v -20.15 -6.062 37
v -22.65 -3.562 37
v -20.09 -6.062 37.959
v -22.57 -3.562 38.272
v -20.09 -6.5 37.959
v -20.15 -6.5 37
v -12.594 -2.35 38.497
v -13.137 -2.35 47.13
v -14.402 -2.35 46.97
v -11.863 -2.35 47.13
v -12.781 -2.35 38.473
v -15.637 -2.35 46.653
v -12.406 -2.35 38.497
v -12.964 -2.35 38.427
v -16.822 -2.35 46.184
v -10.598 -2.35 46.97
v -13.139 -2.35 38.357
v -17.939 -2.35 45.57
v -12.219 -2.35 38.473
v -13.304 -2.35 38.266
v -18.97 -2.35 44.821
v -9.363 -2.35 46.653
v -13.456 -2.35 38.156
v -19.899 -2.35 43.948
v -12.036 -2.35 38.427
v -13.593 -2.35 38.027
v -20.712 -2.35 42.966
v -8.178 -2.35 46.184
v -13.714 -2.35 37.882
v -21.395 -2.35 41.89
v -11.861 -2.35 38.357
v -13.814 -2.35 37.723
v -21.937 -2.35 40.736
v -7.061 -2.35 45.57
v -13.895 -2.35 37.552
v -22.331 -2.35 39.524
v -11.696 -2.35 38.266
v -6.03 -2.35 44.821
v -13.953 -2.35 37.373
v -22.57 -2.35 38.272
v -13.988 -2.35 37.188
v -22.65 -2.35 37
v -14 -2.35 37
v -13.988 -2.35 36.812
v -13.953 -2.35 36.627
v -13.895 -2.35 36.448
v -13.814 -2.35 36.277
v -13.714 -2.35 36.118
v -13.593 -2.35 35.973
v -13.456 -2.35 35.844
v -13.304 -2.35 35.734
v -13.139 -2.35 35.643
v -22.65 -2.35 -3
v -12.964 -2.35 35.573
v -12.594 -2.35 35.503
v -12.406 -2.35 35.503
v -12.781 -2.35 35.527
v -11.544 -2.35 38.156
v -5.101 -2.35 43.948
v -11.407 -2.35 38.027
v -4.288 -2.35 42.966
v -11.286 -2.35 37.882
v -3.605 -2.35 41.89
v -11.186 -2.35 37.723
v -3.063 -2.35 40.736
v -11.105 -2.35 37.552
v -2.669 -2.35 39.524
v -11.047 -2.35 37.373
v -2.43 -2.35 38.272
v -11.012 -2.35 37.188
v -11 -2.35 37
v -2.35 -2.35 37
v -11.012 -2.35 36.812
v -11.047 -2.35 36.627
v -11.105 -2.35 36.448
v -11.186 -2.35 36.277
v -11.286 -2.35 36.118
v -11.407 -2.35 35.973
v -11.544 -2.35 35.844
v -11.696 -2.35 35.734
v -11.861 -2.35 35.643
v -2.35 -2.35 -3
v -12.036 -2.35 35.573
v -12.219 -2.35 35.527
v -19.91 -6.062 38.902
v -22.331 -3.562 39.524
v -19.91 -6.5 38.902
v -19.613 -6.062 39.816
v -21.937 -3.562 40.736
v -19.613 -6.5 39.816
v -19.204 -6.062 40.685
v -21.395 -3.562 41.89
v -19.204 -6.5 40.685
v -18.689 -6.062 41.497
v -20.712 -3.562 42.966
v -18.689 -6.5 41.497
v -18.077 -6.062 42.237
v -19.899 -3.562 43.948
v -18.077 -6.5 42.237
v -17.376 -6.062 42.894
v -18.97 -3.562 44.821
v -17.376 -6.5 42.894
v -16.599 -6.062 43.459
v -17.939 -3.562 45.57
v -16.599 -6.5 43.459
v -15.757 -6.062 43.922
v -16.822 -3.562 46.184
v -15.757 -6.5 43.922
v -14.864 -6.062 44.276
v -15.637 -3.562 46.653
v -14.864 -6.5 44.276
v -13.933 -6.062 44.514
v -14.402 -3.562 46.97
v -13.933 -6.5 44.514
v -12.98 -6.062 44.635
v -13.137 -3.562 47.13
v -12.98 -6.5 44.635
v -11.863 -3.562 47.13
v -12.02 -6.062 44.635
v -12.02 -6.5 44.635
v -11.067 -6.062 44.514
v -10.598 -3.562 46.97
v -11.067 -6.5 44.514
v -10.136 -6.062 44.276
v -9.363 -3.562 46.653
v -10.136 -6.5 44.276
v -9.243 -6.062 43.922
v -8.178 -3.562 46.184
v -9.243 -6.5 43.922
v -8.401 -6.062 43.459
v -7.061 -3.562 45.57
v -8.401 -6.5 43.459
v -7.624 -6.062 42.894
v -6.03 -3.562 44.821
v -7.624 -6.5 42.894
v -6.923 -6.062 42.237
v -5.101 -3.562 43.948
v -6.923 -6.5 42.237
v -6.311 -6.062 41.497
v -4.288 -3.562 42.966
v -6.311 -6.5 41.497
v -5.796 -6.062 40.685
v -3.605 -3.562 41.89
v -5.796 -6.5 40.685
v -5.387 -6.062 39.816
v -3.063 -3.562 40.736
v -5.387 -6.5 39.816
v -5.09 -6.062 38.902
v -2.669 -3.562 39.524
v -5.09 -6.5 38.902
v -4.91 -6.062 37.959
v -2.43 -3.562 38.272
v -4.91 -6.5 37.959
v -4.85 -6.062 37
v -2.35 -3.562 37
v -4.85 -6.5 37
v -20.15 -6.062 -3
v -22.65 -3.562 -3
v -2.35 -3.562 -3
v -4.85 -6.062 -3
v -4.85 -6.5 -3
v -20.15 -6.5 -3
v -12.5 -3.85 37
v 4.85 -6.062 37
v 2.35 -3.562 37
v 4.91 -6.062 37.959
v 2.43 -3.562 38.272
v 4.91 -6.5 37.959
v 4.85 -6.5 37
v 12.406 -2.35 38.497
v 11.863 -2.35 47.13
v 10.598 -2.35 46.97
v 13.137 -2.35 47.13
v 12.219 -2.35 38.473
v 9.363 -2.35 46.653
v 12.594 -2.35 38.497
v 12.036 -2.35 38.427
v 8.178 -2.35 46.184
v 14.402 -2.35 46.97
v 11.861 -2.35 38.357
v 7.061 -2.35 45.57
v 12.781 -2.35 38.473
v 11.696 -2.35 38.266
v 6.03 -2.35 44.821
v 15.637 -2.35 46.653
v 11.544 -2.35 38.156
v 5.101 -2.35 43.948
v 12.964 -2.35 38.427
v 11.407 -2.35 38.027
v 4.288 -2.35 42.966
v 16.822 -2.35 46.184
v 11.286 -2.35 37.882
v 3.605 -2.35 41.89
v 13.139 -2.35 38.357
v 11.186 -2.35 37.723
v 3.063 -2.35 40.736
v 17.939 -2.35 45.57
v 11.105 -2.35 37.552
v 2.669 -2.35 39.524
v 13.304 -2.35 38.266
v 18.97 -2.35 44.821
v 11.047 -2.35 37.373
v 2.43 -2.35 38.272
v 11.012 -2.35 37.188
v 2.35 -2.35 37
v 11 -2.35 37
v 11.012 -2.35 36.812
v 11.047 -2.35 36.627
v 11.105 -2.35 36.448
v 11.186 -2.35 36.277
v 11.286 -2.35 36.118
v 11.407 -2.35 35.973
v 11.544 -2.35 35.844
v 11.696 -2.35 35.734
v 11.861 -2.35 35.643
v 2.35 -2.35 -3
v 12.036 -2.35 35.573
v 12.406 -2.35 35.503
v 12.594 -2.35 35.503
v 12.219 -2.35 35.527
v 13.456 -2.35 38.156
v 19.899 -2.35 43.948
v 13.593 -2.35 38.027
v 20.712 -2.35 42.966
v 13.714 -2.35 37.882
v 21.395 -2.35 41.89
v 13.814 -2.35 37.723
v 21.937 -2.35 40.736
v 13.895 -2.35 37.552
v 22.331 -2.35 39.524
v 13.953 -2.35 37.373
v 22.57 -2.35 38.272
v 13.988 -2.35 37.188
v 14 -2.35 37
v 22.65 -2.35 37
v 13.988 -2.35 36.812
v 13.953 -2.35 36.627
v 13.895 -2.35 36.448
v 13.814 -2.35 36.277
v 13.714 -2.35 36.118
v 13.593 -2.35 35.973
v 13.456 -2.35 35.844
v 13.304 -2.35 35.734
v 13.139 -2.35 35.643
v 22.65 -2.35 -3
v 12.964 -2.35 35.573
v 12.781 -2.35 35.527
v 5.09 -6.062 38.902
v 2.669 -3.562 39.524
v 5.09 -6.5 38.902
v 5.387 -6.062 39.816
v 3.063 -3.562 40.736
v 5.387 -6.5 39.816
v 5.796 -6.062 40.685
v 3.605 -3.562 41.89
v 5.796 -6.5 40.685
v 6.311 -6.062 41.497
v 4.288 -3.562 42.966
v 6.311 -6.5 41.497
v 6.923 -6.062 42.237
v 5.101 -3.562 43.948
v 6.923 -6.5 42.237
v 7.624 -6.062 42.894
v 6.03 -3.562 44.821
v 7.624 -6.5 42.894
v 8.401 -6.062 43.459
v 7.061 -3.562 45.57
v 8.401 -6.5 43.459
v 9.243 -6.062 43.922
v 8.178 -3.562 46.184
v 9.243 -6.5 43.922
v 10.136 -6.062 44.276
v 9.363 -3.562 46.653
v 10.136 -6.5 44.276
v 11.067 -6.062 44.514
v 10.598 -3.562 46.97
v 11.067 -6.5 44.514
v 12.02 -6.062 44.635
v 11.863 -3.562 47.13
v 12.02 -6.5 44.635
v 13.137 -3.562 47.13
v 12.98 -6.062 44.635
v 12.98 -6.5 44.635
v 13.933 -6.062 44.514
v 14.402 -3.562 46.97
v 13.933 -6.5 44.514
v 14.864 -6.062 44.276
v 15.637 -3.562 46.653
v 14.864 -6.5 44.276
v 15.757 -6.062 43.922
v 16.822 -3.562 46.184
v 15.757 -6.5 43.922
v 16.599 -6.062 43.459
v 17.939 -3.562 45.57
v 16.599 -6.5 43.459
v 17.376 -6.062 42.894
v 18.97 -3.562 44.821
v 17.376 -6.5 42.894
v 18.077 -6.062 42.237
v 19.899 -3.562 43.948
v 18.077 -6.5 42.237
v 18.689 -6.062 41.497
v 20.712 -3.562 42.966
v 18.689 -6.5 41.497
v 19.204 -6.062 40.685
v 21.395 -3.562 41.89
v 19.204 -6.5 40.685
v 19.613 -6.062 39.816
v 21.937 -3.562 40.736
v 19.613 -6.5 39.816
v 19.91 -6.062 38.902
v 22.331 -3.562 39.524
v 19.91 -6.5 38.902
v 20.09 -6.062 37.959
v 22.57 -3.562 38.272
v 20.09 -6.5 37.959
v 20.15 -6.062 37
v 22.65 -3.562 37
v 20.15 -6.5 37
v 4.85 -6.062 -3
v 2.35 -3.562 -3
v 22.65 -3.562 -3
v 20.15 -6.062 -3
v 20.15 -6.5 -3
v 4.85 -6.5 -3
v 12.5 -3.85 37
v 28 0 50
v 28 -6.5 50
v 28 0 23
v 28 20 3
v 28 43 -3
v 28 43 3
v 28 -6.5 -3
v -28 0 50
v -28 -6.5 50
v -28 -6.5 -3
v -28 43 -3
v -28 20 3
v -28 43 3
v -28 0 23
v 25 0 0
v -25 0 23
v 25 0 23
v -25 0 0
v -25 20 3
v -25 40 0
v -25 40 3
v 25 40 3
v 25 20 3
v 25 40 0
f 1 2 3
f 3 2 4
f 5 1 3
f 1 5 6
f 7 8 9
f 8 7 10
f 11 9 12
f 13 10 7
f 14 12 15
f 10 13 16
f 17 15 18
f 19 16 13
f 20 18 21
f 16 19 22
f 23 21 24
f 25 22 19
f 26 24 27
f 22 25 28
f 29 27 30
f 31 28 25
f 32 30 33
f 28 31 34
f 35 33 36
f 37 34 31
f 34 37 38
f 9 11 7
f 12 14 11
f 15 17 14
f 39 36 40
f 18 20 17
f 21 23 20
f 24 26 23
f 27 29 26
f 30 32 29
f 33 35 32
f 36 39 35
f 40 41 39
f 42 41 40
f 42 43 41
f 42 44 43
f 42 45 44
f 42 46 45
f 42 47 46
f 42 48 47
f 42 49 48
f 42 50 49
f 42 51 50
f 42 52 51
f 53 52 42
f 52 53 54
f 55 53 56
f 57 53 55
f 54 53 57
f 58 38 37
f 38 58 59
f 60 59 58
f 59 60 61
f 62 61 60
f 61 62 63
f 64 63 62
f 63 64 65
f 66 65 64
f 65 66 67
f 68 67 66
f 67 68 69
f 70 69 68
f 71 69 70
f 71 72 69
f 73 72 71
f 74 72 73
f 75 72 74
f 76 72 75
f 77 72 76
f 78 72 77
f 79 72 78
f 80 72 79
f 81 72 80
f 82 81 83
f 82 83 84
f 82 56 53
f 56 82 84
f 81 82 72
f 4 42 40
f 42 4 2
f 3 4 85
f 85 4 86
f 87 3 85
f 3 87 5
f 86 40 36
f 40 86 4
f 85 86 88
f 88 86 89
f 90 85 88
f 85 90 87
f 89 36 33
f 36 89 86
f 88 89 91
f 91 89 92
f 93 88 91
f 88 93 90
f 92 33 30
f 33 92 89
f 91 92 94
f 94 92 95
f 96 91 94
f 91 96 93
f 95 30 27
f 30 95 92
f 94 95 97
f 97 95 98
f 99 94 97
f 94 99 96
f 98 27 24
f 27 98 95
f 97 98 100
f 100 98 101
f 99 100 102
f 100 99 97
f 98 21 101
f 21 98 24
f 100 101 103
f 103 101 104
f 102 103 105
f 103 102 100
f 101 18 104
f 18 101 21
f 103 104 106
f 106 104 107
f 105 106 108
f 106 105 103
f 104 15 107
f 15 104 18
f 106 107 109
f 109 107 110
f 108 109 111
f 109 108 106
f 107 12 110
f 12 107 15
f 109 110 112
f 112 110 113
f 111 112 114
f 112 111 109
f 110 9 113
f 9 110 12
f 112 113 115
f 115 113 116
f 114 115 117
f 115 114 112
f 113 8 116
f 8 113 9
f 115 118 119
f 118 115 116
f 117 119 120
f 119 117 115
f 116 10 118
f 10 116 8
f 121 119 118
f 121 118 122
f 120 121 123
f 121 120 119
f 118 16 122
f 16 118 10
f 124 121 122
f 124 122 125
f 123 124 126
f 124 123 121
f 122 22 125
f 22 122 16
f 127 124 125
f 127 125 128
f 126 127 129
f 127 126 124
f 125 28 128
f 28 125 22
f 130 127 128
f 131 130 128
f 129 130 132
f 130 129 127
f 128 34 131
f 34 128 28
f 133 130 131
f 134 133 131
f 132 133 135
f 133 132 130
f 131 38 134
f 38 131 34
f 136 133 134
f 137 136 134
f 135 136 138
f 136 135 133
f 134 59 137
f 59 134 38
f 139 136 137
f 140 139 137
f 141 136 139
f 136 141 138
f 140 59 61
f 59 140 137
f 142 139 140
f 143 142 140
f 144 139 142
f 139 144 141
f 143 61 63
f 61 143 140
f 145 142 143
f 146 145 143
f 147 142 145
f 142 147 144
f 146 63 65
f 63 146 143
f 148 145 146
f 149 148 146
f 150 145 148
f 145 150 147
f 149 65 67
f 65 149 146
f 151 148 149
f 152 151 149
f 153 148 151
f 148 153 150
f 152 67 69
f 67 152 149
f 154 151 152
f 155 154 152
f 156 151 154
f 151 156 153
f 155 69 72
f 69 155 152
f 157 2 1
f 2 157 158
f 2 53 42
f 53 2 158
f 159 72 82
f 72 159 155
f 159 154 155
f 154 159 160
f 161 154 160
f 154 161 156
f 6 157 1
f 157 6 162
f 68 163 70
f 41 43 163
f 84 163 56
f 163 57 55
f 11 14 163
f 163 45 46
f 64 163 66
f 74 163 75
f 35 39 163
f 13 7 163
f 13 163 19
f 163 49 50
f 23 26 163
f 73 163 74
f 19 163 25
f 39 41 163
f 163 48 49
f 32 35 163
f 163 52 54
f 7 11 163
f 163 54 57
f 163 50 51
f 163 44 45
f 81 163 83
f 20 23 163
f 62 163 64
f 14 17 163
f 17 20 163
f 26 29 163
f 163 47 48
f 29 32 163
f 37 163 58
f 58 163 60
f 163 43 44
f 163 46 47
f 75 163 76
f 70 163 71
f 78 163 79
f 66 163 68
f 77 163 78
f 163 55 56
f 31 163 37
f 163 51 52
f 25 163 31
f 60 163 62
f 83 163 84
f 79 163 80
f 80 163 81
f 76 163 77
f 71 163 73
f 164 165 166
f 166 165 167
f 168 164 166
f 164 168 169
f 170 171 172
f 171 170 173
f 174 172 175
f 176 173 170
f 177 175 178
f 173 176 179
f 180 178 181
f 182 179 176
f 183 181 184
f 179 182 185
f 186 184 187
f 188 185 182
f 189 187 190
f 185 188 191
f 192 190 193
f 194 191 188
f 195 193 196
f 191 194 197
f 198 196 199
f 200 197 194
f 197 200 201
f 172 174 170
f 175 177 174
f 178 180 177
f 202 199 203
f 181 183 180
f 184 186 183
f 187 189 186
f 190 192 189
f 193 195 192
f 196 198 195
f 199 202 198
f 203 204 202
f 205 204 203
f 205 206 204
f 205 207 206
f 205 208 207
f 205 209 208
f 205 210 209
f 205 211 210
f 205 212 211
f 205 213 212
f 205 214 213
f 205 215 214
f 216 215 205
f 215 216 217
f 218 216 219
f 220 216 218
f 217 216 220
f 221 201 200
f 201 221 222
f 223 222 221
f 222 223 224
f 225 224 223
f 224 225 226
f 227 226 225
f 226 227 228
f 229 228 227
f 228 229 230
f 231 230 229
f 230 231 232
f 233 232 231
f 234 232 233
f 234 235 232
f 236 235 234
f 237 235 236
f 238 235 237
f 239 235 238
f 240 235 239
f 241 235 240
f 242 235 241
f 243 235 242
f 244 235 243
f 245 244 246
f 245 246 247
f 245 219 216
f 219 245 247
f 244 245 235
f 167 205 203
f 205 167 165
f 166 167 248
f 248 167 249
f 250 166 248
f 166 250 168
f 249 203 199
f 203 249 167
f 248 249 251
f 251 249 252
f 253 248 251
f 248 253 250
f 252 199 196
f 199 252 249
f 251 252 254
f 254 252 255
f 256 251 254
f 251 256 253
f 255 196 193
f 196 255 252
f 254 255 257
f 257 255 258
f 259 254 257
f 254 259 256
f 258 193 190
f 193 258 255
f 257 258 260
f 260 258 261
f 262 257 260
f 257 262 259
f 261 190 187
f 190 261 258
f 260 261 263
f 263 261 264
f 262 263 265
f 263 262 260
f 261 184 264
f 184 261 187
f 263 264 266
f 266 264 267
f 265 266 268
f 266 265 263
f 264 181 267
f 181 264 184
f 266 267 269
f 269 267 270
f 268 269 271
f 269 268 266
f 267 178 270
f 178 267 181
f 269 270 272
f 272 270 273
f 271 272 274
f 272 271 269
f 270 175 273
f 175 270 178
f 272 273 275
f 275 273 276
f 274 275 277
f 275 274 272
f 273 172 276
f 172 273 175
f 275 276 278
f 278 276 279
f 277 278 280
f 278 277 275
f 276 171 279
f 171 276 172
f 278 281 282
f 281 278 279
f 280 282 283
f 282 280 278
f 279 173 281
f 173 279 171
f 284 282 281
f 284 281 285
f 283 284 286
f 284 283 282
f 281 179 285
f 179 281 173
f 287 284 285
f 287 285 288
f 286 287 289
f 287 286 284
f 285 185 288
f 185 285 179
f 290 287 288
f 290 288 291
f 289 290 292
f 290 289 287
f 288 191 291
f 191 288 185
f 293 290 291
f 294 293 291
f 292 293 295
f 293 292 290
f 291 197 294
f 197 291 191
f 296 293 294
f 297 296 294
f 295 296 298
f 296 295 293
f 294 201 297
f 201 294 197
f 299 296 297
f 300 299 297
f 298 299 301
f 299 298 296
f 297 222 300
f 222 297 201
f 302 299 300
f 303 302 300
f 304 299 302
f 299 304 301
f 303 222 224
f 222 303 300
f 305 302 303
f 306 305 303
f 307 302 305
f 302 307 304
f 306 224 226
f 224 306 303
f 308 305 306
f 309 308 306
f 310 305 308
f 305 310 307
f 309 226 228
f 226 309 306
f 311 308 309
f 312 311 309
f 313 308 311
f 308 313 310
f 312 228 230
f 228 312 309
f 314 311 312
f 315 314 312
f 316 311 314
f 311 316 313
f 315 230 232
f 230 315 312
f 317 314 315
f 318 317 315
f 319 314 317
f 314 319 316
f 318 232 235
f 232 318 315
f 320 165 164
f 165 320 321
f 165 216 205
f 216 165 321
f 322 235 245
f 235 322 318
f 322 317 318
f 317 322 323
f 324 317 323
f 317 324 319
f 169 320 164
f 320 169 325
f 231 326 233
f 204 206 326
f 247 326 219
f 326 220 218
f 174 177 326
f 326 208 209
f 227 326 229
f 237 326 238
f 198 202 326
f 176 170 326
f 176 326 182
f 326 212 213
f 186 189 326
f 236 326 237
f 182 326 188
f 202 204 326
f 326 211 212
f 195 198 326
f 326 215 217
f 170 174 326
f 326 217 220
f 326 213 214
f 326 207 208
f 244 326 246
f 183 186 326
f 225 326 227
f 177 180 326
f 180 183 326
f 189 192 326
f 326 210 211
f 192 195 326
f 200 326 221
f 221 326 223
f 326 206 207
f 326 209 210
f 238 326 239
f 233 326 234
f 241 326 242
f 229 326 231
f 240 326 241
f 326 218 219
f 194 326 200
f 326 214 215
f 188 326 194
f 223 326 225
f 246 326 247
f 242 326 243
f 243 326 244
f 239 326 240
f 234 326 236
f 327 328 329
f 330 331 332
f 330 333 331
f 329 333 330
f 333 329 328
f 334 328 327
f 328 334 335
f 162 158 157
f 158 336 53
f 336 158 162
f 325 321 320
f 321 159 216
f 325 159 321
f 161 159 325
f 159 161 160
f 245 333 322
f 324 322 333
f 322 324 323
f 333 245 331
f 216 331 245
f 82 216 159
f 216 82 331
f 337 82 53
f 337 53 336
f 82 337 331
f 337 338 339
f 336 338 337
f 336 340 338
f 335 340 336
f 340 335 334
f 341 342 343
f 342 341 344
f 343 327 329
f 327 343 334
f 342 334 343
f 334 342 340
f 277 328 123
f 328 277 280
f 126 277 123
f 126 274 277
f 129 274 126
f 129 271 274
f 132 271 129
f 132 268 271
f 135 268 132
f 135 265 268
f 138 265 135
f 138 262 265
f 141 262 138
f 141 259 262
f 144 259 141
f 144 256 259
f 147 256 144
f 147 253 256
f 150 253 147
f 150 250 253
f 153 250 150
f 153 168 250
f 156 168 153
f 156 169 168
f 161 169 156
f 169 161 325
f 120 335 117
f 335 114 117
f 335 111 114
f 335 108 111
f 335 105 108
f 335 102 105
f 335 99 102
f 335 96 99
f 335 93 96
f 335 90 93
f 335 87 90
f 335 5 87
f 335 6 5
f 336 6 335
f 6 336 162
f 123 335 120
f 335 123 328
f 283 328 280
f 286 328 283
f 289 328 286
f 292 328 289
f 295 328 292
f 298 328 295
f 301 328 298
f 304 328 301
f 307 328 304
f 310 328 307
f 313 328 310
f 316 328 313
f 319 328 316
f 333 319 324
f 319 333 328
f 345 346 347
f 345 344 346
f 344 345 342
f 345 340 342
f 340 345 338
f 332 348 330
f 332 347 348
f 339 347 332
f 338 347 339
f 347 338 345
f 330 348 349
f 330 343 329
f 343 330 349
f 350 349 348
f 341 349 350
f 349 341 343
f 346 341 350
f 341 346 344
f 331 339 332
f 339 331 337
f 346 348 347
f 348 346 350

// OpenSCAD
/*Created by Andy Levesque
Credit to @David D on Printables and Jonathan at Keep Making for Multiconnect and Multiboard, respectively
Licensed Creative Commons 4.0 Attribution Non-Commercial Sharable with Attribution
*/

/* [Internal Dimensions] */
//Height (in mm) from the top of the back to the base of the internal floor
internalHeight = 50.0; //.1
//Width (in mm) of the internal dimension or item you wish to hold
internalWidth = 50.0; //.1
//Length (i.e., distance from back) (in mm) of the internal dimension or item you wish to hold
internalDepth = 40.0; //.1

/* [Shelf Customizations] */
//Distance upward from the bottom (in mm) that captures the bottom front of the item
rimHeight = 3;
bracket_style = "45deg"; //[45deg,half_distance,none]

/* [Additional Customization] */
//Thickness of bin walls (in mm)
wallThickness = 3; //.1
//Thickness of bin  (in mm)
baseThickness = 3; //.1

/*[Slot Customization]*/
//Distance between Multiconnect slots on the back (25mm is standard for MultiBoard)
distanceBetweenSlots = 25;
//QuickRelease removes the small indent in the top of the slots that lock the part into place
slotQuickRelease = false;
//Dimple scale tweaks the size of the dimple in the slot for printers that need a larger dimple to print correctly
dimpleScale = 1; //[0.5:.05:1.5]
//Scale of slots in the back (1.015 scale is default per MultiConnect specs)
slotTolerance = 1.00; //[0.925:0.005:1.075]
//Move the slot in (positive) or out (negative)
slotDepthMicroadjustment = 0; //[-.5:0.05:.5]


/* [Hidden] */
//Thickness of the back of the item (default in 6.5mm). Changes are untested. 
backThickness = 6.5; //.1
//profile coordinates for the multiconnect slot
slotProfile = [[0,0],[10.15,0],[10.15,1.2121],[7.65,3.712],[7.65,5],[0,5]];


//Calculated
totalHeight = max(internalHeight+baseThickness,25);
totalDepth = internalDepth + backThickness + wallThickness;
totalWidth = max(internalWidth + wallThickness*2,25);
productCenterX = internalWidth/2;
//slot count calculates how many slots can fit on the back. Based on internal width for buffer.
slotCount = floor(totalWidth/distanceBetweenSlots);
echo(str("Slot Count: ",slotCount));

//move to center
translate(v = [-totalWidth/2,0,-baseThickness]) 
    multiconnectBack(backWidth = totalWidth, backHeight = totalHeight);
translate(v = [-internalWidth/2,0,0]) 
    //Basket minus slots
    difference() {
        shelf();
            //delete tool for anything above the product (i.e., bracket fix)
        color("red") translate(v = [-wallThickness-1 ,-1,internalHeight]) cube([totalWidth+2,totalDepth+2,totalHeight]); 
    }

//Create Basket
module shelf() {
    union() {
        //bottom
        translate([-wallThickness,0,-baseThickness])
            cube([internalWidth + wallThickness*2, internalDepth + wallThickness,baseThickness]);

        //left wall
        translate([-wallThickness,0,0])
            cube([wallThickness, internalDepth + wallThickness, rimHeight]);

        //right wall
        translate([internalWidth,0,0])
            cube([wallThickness, internalDepth + wallThickness, rimHeight]);

        //front wall
        translate([0,internalDepth,0]) 
            cube([internalWidth,wallThickness,rimHeight]);

        bracketDistance = min(internalHeight/2,internalDepth/2);
        echo(str("Bracket Distance: ",bracketDistance));
        
        //shelf brackets      
        if (bracket_style == "half_distance") {
            translate(v = [0,0,internalHeight/2+rimHeight])
                shelfBracket(bracketHeight = internalHeight/2, bracketDepth = internalDepth/2);
            translate(v = [internalWidth+wallThickness,0,internalHeight/2+rimHeight])
                shelfBracket(bracketHeight = internalHeight/2, bracketDepth = internalDepth/2);
        }
        if (bracket_style == "45deg"){
            translate(v = [0,0,bracketDistance+rimHeight])
                shelfBracket(bracketHeight = bracketDistance, bracketDepth = bracketDistance);
            translate(v = [internalWidth+wallThickness,0,bracketDistance+rimHeight])
                shelfBracket(bracketHeight = bracketDistance, bracketDepth = bracketDistance);
        }
    }
            
}

//BEGIN MODULES
//Slotted back
module multiconnectBack(backWidth, backHeight)
{
    difference() {
        translate(v = [0,-6.5,0]) cube(size = [backWidth,6.5,backHeight]);
        //Loop through slots and center on the item
        //Note: I kept doing math until it looked right. It's possible this can be simplified.
        for (slotNum = [0:1:slotCount-1]) {
            translate(v = [distanceBetweenSlots/2+(backWidth/distanceBetweenSlots-slotCount)*distanceBetweenSlots/2+slotNum*distanceBetweenSlots,-2.35+slotDepthMicroadjustment,backHeight-13]) {
                color(c = "red")  slotTool(backHeight);
            }
        }
    }
    //Create Slot Tool
    module slotTool(totalHeight) {
        scale(v = slotTolerance)
        difference() {
            union() {
                //round top
                rotate(a = [90,0,0,]) 
                    rotate_extrude($fn=50) 
                        polygon(points = slotProfile);
                //long slot
                translate(v = [0,0,0]) 
                    rotate(a = [180,0,0]) 
                    linear_extrude(height = totalHeight+1) 
                        union(){
                            polygon(points = slotProfile);
                            mirror([1,0,0])
                                polygon(points = slotProfile);
                        }
            }
            //dimple
            if (slotQuickRelease == false)
                scale(v = dimpleScale) 
                rotate(a = [90,0,0,]) 
                    rotate_extrude($fn=50) 
                        polygon(points = [[0,0],[0,1.5],[1.5,0]]);
        }
    }
}

module shelfBracket(bracketHeight, bracketDepth){
        rotate(a = [-90,0,90]) 
            linear_extrude(height = wallThickness) 
                polygon([[0,0],[0,bracketHeight],[bracketDepth,bracketHeight]]);
}
